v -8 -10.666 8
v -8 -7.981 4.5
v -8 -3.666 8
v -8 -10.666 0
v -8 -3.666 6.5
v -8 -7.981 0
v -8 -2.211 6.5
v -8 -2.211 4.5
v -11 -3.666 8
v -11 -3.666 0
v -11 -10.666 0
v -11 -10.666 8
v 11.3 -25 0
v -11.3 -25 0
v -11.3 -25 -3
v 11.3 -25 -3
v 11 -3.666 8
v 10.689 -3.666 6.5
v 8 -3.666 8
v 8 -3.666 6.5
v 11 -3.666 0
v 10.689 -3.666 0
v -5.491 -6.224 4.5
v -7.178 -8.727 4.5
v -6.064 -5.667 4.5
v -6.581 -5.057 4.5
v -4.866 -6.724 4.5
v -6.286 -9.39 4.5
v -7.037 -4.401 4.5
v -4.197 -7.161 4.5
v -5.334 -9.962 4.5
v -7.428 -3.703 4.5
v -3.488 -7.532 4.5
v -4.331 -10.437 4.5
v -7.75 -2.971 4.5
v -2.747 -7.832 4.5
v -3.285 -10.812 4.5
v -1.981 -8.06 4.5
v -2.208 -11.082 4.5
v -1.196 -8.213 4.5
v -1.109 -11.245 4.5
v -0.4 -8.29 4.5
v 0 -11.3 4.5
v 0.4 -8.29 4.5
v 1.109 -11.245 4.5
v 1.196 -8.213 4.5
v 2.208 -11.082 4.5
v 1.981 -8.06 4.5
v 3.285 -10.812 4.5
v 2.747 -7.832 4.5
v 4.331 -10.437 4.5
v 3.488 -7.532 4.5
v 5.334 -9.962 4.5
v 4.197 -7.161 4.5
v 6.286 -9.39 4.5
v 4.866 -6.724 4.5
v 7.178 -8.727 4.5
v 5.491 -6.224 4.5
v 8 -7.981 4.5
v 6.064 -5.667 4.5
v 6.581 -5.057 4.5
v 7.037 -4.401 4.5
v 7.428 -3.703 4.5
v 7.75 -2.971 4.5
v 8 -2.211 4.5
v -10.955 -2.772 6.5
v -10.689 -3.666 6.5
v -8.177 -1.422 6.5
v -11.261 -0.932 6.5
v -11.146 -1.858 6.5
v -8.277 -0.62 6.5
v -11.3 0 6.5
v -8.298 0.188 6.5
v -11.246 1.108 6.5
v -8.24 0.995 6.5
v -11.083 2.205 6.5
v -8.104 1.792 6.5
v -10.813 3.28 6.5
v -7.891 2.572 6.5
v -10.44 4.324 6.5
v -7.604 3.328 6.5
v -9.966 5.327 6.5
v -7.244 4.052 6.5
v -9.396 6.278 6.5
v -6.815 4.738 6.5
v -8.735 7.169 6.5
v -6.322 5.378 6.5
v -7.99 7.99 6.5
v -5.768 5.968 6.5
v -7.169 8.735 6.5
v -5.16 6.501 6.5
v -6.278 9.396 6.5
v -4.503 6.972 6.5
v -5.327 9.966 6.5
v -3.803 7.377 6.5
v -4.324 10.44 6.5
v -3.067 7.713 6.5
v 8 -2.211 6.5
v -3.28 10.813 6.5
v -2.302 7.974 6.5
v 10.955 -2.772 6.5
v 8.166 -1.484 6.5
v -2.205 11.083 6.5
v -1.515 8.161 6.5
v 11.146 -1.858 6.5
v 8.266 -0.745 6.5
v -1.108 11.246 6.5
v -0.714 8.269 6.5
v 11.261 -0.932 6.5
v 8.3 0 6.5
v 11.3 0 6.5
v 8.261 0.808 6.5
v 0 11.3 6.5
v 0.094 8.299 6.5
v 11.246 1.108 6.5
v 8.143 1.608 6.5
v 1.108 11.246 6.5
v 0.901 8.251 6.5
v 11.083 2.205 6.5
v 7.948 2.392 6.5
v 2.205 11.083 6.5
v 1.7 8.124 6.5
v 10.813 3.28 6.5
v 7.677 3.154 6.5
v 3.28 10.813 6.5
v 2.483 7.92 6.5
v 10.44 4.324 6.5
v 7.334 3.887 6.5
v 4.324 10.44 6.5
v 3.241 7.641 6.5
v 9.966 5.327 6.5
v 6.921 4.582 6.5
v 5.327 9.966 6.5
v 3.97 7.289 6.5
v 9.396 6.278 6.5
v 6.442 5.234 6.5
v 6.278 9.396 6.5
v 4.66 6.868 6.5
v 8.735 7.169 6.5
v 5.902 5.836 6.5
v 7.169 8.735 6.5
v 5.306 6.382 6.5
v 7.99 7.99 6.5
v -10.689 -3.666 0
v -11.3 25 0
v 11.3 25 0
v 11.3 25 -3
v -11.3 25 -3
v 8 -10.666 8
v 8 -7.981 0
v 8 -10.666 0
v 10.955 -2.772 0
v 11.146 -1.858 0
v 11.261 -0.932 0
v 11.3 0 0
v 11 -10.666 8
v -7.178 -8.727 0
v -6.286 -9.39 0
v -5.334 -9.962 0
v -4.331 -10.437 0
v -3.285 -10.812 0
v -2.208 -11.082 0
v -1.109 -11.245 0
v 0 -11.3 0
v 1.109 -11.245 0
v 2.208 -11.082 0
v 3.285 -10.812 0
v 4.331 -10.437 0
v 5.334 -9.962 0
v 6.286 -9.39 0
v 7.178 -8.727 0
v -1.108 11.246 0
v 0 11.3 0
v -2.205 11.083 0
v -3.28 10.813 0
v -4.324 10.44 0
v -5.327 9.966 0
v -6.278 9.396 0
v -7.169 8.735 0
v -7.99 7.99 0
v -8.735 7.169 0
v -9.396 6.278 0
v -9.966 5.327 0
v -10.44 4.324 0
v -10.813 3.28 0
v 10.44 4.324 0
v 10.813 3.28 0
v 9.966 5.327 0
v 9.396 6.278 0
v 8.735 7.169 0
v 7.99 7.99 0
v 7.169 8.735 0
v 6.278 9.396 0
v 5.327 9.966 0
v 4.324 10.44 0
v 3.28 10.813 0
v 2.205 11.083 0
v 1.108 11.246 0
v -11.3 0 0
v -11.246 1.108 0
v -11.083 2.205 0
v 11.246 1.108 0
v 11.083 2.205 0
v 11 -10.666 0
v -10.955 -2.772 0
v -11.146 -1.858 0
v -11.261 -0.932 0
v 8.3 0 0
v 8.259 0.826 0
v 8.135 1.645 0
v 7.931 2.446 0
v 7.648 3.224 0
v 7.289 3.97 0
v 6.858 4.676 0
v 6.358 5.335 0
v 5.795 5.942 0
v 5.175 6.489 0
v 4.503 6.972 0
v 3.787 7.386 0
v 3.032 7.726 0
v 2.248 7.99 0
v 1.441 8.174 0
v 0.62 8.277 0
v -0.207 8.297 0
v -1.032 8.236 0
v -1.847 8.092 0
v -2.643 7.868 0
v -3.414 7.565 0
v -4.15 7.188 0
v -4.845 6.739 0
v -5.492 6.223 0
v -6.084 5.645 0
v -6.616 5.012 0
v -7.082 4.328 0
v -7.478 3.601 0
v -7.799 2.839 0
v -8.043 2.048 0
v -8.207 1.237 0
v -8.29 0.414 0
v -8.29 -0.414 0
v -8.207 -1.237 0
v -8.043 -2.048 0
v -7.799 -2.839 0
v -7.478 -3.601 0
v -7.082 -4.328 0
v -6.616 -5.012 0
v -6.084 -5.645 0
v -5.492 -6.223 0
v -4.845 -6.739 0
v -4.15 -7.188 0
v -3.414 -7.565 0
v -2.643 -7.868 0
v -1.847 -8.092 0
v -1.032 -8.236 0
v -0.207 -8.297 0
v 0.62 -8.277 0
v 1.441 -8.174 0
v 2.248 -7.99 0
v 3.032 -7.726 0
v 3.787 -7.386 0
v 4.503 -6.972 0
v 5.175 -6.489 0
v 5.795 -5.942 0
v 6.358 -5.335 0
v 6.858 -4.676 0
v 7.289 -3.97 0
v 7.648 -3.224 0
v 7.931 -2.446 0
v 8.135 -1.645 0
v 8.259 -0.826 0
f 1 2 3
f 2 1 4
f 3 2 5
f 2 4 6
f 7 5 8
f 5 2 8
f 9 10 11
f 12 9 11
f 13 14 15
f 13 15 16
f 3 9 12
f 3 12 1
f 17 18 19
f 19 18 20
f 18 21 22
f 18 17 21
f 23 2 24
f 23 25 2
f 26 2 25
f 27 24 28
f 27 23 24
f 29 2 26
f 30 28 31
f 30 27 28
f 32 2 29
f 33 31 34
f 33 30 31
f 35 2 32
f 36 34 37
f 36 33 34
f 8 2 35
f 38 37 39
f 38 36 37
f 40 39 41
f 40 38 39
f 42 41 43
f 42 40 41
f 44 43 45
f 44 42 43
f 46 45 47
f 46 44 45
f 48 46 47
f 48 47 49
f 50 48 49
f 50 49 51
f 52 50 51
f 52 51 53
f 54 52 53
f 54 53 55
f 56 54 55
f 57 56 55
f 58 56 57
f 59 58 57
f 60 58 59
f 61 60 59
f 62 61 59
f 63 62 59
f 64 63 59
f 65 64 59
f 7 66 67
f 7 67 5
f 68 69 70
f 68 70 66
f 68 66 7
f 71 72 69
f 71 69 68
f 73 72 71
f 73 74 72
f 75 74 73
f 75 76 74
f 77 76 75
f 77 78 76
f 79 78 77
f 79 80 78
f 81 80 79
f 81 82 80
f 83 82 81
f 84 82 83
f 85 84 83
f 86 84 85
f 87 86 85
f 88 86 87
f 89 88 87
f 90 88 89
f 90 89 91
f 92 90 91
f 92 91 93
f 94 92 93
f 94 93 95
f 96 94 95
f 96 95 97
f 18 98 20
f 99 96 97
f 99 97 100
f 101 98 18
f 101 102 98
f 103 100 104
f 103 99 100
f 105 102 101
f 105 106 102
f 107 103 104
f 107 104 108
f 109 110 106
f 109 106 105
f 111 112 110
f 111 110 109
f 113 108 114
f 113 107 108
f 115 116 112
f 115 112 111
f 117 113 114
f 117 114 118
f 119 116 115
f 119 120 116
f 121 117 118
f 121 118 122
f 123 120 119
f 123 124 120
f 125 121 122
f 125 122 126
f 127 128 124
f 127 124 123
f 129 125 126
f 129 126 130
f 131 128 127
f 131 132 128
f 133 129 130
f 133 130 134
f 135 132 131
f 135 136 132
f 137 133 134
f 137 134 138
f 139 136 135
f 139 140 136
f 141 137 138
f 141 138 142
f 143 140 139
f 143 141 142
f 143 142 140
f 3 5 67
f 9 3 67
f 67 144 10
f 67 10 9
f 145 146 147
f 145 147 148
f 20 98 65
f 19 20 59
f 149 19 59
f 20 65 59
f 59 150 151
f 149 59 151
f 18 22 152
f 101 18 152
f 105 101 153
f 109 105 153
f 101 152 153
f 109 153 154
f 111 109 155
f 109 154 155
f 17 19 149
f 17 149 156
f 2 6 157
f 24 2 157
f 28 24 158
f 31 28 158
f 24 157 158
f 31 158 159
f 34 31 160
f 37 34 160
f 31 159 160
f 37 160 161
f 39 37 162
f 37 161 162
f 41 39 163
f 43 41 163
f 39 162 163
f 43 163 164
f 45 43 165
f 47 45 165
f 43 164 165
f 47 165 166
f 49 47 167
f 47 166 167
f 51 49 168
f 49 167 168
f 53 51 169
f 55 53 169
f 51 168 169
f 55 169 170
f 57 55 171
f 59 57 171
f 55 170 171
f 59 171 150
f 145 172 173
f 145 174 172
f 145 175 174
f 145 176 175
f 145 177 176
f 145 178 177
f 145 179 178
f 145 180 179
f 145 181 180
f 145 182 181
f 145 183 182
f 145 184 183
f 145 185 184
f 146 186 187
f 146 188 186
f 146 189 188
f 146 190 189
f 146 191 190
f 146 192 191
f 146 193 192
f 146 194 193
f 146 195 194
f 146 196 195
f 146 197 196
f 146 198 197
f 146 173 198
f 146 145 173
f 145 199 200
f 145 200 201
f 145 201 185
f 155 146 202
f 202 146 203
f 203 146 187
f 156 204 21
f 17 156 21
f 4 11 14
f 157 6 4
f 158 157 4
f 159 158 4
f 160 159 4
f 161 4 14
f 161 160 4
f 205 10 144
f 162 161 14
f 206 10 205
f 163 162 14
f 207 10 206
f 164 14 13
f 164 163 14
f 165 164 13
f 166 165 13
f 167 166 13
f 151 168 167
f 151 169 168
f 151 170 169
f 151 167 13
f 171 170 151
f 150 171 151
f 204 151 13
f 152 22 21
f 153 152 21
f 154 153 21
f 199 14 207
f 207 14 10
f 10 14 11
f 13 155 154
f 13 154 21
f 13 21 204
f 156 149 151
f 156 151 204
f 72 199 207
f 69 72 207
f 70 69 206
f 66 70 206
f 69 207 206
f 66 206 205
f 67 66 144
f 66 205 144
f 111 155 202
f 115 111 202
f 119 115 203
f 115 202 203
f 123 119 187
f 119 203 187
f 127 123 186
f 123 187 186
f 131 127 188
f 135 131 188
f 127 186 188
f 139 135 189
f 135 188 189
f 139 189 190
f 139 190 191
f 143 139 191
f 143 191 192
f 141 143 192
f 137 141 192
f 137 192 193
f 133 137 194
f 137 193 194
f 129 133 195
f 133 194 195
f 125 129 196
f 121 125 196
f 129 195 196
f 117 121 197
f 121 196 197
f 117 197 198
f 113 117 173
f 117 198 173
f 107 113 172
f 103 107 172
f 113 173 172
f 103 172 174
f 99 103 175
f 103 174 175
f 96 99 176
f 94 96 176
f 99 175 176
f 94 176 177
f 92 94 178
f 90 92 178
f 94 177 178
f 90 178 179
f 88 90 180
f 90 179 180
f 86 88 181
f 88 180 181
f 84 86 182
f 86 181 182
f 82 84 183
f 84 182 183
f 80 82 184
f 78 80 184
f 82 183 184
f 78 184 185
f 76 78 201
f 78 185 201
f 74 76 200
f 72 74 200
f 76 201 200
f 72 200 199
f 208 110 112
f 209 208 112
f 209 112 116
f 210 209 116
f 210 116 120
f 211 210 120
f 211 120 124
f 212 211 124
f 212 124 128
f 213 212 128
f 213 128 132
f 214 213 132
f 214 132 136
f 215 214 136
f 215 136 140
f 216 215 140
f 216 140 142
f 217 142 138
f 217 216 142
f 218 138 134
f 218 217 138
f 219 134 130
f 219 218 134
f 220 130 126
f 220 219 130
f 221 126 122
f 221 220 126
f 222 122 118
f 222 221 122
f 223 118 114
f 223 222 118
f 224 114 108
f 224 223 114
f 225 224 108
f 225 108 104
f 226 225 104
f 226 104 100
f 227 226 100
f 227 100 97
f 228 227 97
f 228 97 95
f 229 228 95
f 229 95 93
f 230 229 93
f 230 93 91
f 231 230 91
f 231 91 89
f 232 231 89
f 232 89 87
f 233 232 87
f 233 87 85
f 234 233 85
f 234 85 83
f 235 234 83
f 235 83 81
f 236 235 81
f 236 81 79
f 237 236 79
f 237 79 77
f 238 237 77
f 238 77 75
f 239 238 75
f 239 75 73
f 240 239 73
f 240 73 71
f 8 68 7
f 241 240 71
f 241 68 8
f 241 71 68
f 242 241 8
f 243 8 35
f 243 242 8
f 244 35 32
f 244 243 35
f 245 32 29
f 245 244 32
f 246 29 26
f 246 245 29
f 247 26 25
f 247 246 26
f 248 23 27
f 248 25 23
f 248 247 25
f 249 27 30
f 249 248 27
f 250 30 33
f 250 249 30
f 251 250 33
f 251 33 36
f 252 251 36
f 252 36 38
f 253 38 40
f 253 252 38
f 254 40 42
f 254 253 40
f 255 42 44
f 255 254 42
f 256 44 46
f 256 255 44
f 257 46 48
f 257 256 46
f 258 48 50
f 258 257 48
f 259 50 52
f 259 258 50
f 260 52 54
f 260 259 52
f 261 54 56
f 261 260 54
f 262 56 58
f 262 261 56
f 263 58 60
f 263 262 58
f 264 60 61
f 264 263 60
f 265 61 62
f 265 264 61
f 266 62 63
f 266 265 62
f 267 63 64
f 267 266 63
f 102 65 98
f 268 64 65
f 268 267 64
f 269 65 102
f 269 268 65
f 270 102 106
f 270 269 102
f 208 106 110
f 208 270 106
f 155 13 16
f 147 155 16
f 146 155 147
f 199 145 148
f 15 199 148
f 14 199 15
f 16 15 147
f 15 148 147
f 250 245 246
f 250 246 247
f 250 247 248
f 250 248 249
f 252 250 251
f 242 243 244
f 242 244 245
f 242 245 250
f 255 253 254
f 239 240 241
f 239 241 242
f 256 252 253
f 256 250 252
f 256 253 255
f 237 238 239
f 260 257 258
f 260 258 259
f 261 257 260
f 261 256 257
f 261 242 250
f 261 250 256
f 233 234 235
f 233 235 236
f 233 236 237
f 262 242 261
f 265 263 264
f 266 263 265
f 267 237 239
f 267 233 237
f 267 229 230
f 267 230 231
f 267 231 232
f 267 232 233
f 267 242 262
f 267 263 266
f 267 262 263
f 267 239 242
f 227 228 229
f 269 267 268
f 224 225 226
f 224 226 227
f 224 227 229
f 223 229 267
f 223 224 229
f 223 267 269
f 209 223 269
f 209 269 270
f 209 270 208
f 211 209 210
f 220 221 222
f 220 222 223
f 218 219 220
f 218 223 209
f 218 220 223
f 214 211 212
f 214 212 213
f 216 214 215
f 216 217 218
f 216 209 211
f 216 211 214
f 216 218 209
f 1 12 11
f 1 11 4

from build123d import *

# Parameters (mm, degrees)
F0_R     = 8.3
F1_DEPTH = 6.5
F2_DEPTH = 8
F4_DEPTH = 2
F5_DEPTH = 3


with BuildPart() as f1:
    # F0 (on Top) → F1 (new body)
    with BuildSketch(Plane.XY):
        with BuildLine():
            ThreePointArc((10.6887791632, -3.666060556), (11.1461474184, -1.8583319746), (11.3, 0))
            ThreePointArc((11.3, 0), (6.7e-09, 11.3), (-11.3, 1.34e-08))
            ThreePointArc((-11.3, 1.34e-08), (-11.1461474195, -1.858331968), (-10.6887791632, -3.666060556))
            Line((-10.6887791632, -3.666060556), (-8, -3.666060556))
            Line((-8, -3.666060556), (-8, -7.9806014811))
            ThreePointArc((-8, -7.9806014811), (0, -11.3), (8, -7.9806014811))
            Line((8, -7.9806014811), (8, -3.666060556))
            Line((8, -3.666060556), (10.6887791632, -3.666060556))
        make_face()
        Circle(F0_R, mode=Mode.SUBTRACT)
    extrude(amount=F1_DEPTH)

    # F0 (on Top) → F2 (join)
    with BuildSketch(Plane.XY):
        with BuildLine():
            ThreePointArc((8, -7.9806014811), (9.5901737472, -5.9765012757), (10.6887791632, -3.666060556))
            Line((10.6887791632, -3.666060556), (8, -3.666060556))
            Line((8, -3.666060556), (8, -7.9806014811))
        make_face()
        with BuildLine():
            Line((11, -3.666060556), (10.6887791632, -3.666060556))
            ThreePointArc((10.6887791632, -3.666060556), (9.5901737472, -5.9765012757), (8, -7.9806014811))
            Line((8, -7.9806014811), (8, -10.666060556))
            Line((8, -10.666060556), (11, -10.666060556))
            Line((11, -10.666060556), (11, -3.666060556))
        make_face()
        with BuildLine():
            ThreePointArc((-8, -7.9806014811), (-9.5901737472, -5.9765012757), (-10.6887791632, -3.666060556))
            Line((-10.6887791632, -3.666060556), (-11, -3.666060556))
            Line((-11, -3.666060556), (-11, -10.666060556))
            Line((-11, -10.666060556), (-8, -10.666060556))
            Line((-8, -10.666060556), (-8, -7.9806014811))
        make_face()
        with BuildLine():
            Line((-8, -3.666060556), (-10.6887791632, -3.666060556))
            ThreePointArc((-10.6887791632, -3.666060556), (-9.5901737472, -5.9765012757), (-8, -7.9806014811))
            Line((-8, -7.9806014811), (-8, -3.666060556))
        make_face()
    extrude(amount=F2_DEPTH)

    # F3 (on face) → F4 (cut)
    with BuildSketch(Plane.XY.offset(6.5)):
        with BuildLine():
            Line((7.4464756765, -3.666060556), (-7.4464756765, -3.666060556))
            ThreePointArc((-7.4464756765, -3.666060556), (0, -8.3), (7.4464756765, -3.666060556))
        make_face()
        with BuildLine():
            Line((-7.4464756765, -3.666060556), (-8, -3.666060556))
            Line((-8, -3.666060556), (-8, -7.9806014811))
            ThreePointArc((-8, -7.9806014811), (-6.0175392622, -9.5644770494), (-3.7316420268, -10.666060556))
            Line((-3.7316420268, -10.666060556), (3.7316420268, -10.666060556))
            ThreePointArc((3.7316420268, -10.666060556), (6.0175392622, -9.5644770494), (8, -7.9806014811))
            Line((8, -7.9806014811), (8, -3.666060556))
            Line((8, -3.666060556), (7.4464756765, -3.666060556))
            ThreePointArc((7.4464756765, -3.666060556), (0, -8.3), (-7.4464756765, -3.666060556))
        make_face()
        with BuildLine():
            ThreePointArc((8, -7.9806014811), (6.0175392622, -9.5644770494), (3.7316420268, -10.666060556))
            Line((3.7316420268, -10.666060556), (8, -10.666060556))
            Line((8, -10.666060556), (8, -7.9806014811))
        make_face()
        with BuildLine():
            ThreePointArc((-3.7316420268, -10.666060556), (-6.0175392622, -9.5644770494), (-8, -7.9806014811))
            Line((-8, -7.9806014811), (-8, -10.666060556))
            Line((-8, -10.666060556), (-3.7316420268, -10.666060556))
        make_face()
        with BuildLine():
            Line((8, -10.666060556), (3.7316420268, -10.666060556))
            ThreePointArc((3.7316420268, -10.666060556), (1.8925532645, -11.1403878811), (0, -11.3))
            Line((0, -11.3), (8, -11.3))
            Line((8, -11.3), (8, -10.666060556))
        make_face()
        with BuildLine():
            Line((3.7316420268, -10.666060556), (-3.7316420268, -10.666060556))
            ThreePointArc((-3.7316420268, -10.666060556), (-1.8925532645, -11.1403878811), (0, -11.3))
            ThreePointArc((0, -11.3), (1.8925532645, -11.1403878811), (3.7316420268, -10.666060556))
        make_face()
        with BuildLine():
            Line((-3.7316420268, -10.666060556), (-8, -10.666060556))
            Line((-8, -10.666060556), (-8, -11.3))
            Line((-8, -11.3), (0, -11.3))
            ThreePointArc((0, -11.3), (-1.8925532645, -11.1403878811), (-3.7316420268, -10.666060556))
        make_face()
        with BuildLine():
            ThreePointArc((8, -2.2113344387), (7.7574132109, -2.951701251), (7.4464756765, -3.666060556))
            Line((7.4464756765, -3.666060556), (8, -3.666060556))
            Line((8, -3.666060556), (8, -2.2113344387))
        make_face()
        with BuildLine():
            Line((-8, -2.2113344387), (-8, -3.666060556))
            Line((-8, -3.666060556), (-7.4464756765, -3.666060556))
            ThreePointArc((-7.4464756765, -3.666060556), (-7.7574132109, -2.951701251), (-8, -2.2113344387))
        make_face()
        with BuildLine():
            ThreePointArc((-8, -2.2113344387), (-7.7574132109, -2.951701251), (-7.4464756765, -3.666060556))
            Line((-7.4464756765, -3.666060556), (7.4464756765, -3.666060556))
            ThreePointArc((7.4464756765, -3.666060556), (7.7574132109, -2.951701251), (8, -2.2113344387))
            Line((8, -2.2113344387), (-8, -2.2113344387))
        make_face()
    extrude(amount=-F4_DEPTH, mode=Mode.SUBTRACT)

    # F0 (on Top) → F5 (join)
    with BuildSketch(Plane.XY):
        with BuildLine():
            ThreePointArc((10.6887791632, -3.666060556), (11.1461474184, -1.8583319746), (11.3, 0))
            ThreePointArc((11.3, 0), (6.7e-09, 11.3), (-11.3, 1.34e-08))
            ThreePointArc((-11.3, 1.34e-08), (-11.1461474195, -1.858331968), (-10.6887791632, -3.666060556))
            Line((-10.6887791632, -3.666060556), (-8, -3.666060556))
            Line((-8, -3.666060556), (-8, -7.9806014811))
            ThreePointArc((-8, -7.9806014811), (0, -11.3), (8, -7.9806014811))
            Line((8, -7.9806014811), (8, -3.666060556))
            Line((8, -3.666060556), (10.6887791632, -3.666060556))
        make_face()
        Circle(F0_R, mode=Mode.SUBTRACT)
        with BuildLine():
            ThreePointArc((8, -7.9806014811), (9.5901737472, -5.9765012757), (10.6887791632, -3.666060556))
            Line((10.6887791632, -3.666060556), (8, -3.666060556))
            Line((8, -3.666060556), (8, -7.9806014811))
        make_face()
        with BuildLine():
            Line((11, -3.666060556), (10.6887791632, -3.666060556))
            ThreePointArc((10.6887791632, -3.666060556), (9.5901737472, -5.9765012757), (8, -7.9806014811))
            Line((8, -7.9806014811), (8, -10.666060556))
            Line((8, -10.666060556), (11, -10.666060556))
            Line((11, -10.666060556), (11, -3.666060556))
        make_face()
        with BuildLine():
            Line((-8, -3.666060556), (-10.6887791632, -3.666060556))
            ThreePointArc((-10.6887791632, -3.666060556), (-9.5901737472, -5.9765012757), (-8, -7.9806014811))
            Line((-8, -7.9806014811), (-8, -3.666060556))
        make_face()
        with BuildLine():
            ThreePointArc((-8, -7.9806014811), (-9.5901737472, -5.9765012757), (-10.6887791632, -3.666060556))
            Line((-10.6887791632, -3.666060556), (-11, -3.666060556))
            Line((-11, -3.666060556), (-11, -10.666060556))
            Line((-11, -10.666060556), (-8, -10.666060556))
            Line((-8, -10.666060556), (-8, -7.9806014811))
        make_face()
        with BuildLine():
            Line((11.3, -25), (11.3, 0))
            ThreePointArc((11.3, 0), (11.1461474184, -1.8583319746), (10.6887791632, -3.666060556))
            Line((10.6887791632, -3.666060556), (11, -3.666060556))
            Line((11, -3.666060556), (11, -10.666060556))
            Line((11, -10.666060556), (8, -10.666060556))
            Line((8, -10.666060556), (8, -7.9806014811))
            ThreePointArc((8, -7.9806014811), (0, -11.3), (-8, -7.9806014811))
            Line((-8, -7.9806014811), (-8, -10.666060556))
            Line((-8, -10.666060556), (-11, -10.666060556))
            Line((-11, -10.666060556), (-11, -3.666060556))
            Line((-11, -3.666060556), (-10.6887791632, -3.666060556))
            ThreePointArc((-10.6887791632, -3.666060556), (-11.1461474195, -1.858331968), (-11.3, 1.34e-08))
            Line((-11.3, 1.34e-08), (-11.3, -25))
            Line((-11.3, -25), (11.3, -25))
        make_face()
        with BuildLine():
            ThreePointArc((-11.3, 1.34e-08), (6.7e-09, 11.3), (11.3, 0))
            Line((11.3, 0), (11.3, 25))
            Line((11.3, 25), (-11.3, 25))
            Line((-11.3, 25), (-11.3, 1.34e-08))
        make_face()
        Circle(F0_R)
    extrude(amount=-F5_DEPTH)


solid = f1.part
